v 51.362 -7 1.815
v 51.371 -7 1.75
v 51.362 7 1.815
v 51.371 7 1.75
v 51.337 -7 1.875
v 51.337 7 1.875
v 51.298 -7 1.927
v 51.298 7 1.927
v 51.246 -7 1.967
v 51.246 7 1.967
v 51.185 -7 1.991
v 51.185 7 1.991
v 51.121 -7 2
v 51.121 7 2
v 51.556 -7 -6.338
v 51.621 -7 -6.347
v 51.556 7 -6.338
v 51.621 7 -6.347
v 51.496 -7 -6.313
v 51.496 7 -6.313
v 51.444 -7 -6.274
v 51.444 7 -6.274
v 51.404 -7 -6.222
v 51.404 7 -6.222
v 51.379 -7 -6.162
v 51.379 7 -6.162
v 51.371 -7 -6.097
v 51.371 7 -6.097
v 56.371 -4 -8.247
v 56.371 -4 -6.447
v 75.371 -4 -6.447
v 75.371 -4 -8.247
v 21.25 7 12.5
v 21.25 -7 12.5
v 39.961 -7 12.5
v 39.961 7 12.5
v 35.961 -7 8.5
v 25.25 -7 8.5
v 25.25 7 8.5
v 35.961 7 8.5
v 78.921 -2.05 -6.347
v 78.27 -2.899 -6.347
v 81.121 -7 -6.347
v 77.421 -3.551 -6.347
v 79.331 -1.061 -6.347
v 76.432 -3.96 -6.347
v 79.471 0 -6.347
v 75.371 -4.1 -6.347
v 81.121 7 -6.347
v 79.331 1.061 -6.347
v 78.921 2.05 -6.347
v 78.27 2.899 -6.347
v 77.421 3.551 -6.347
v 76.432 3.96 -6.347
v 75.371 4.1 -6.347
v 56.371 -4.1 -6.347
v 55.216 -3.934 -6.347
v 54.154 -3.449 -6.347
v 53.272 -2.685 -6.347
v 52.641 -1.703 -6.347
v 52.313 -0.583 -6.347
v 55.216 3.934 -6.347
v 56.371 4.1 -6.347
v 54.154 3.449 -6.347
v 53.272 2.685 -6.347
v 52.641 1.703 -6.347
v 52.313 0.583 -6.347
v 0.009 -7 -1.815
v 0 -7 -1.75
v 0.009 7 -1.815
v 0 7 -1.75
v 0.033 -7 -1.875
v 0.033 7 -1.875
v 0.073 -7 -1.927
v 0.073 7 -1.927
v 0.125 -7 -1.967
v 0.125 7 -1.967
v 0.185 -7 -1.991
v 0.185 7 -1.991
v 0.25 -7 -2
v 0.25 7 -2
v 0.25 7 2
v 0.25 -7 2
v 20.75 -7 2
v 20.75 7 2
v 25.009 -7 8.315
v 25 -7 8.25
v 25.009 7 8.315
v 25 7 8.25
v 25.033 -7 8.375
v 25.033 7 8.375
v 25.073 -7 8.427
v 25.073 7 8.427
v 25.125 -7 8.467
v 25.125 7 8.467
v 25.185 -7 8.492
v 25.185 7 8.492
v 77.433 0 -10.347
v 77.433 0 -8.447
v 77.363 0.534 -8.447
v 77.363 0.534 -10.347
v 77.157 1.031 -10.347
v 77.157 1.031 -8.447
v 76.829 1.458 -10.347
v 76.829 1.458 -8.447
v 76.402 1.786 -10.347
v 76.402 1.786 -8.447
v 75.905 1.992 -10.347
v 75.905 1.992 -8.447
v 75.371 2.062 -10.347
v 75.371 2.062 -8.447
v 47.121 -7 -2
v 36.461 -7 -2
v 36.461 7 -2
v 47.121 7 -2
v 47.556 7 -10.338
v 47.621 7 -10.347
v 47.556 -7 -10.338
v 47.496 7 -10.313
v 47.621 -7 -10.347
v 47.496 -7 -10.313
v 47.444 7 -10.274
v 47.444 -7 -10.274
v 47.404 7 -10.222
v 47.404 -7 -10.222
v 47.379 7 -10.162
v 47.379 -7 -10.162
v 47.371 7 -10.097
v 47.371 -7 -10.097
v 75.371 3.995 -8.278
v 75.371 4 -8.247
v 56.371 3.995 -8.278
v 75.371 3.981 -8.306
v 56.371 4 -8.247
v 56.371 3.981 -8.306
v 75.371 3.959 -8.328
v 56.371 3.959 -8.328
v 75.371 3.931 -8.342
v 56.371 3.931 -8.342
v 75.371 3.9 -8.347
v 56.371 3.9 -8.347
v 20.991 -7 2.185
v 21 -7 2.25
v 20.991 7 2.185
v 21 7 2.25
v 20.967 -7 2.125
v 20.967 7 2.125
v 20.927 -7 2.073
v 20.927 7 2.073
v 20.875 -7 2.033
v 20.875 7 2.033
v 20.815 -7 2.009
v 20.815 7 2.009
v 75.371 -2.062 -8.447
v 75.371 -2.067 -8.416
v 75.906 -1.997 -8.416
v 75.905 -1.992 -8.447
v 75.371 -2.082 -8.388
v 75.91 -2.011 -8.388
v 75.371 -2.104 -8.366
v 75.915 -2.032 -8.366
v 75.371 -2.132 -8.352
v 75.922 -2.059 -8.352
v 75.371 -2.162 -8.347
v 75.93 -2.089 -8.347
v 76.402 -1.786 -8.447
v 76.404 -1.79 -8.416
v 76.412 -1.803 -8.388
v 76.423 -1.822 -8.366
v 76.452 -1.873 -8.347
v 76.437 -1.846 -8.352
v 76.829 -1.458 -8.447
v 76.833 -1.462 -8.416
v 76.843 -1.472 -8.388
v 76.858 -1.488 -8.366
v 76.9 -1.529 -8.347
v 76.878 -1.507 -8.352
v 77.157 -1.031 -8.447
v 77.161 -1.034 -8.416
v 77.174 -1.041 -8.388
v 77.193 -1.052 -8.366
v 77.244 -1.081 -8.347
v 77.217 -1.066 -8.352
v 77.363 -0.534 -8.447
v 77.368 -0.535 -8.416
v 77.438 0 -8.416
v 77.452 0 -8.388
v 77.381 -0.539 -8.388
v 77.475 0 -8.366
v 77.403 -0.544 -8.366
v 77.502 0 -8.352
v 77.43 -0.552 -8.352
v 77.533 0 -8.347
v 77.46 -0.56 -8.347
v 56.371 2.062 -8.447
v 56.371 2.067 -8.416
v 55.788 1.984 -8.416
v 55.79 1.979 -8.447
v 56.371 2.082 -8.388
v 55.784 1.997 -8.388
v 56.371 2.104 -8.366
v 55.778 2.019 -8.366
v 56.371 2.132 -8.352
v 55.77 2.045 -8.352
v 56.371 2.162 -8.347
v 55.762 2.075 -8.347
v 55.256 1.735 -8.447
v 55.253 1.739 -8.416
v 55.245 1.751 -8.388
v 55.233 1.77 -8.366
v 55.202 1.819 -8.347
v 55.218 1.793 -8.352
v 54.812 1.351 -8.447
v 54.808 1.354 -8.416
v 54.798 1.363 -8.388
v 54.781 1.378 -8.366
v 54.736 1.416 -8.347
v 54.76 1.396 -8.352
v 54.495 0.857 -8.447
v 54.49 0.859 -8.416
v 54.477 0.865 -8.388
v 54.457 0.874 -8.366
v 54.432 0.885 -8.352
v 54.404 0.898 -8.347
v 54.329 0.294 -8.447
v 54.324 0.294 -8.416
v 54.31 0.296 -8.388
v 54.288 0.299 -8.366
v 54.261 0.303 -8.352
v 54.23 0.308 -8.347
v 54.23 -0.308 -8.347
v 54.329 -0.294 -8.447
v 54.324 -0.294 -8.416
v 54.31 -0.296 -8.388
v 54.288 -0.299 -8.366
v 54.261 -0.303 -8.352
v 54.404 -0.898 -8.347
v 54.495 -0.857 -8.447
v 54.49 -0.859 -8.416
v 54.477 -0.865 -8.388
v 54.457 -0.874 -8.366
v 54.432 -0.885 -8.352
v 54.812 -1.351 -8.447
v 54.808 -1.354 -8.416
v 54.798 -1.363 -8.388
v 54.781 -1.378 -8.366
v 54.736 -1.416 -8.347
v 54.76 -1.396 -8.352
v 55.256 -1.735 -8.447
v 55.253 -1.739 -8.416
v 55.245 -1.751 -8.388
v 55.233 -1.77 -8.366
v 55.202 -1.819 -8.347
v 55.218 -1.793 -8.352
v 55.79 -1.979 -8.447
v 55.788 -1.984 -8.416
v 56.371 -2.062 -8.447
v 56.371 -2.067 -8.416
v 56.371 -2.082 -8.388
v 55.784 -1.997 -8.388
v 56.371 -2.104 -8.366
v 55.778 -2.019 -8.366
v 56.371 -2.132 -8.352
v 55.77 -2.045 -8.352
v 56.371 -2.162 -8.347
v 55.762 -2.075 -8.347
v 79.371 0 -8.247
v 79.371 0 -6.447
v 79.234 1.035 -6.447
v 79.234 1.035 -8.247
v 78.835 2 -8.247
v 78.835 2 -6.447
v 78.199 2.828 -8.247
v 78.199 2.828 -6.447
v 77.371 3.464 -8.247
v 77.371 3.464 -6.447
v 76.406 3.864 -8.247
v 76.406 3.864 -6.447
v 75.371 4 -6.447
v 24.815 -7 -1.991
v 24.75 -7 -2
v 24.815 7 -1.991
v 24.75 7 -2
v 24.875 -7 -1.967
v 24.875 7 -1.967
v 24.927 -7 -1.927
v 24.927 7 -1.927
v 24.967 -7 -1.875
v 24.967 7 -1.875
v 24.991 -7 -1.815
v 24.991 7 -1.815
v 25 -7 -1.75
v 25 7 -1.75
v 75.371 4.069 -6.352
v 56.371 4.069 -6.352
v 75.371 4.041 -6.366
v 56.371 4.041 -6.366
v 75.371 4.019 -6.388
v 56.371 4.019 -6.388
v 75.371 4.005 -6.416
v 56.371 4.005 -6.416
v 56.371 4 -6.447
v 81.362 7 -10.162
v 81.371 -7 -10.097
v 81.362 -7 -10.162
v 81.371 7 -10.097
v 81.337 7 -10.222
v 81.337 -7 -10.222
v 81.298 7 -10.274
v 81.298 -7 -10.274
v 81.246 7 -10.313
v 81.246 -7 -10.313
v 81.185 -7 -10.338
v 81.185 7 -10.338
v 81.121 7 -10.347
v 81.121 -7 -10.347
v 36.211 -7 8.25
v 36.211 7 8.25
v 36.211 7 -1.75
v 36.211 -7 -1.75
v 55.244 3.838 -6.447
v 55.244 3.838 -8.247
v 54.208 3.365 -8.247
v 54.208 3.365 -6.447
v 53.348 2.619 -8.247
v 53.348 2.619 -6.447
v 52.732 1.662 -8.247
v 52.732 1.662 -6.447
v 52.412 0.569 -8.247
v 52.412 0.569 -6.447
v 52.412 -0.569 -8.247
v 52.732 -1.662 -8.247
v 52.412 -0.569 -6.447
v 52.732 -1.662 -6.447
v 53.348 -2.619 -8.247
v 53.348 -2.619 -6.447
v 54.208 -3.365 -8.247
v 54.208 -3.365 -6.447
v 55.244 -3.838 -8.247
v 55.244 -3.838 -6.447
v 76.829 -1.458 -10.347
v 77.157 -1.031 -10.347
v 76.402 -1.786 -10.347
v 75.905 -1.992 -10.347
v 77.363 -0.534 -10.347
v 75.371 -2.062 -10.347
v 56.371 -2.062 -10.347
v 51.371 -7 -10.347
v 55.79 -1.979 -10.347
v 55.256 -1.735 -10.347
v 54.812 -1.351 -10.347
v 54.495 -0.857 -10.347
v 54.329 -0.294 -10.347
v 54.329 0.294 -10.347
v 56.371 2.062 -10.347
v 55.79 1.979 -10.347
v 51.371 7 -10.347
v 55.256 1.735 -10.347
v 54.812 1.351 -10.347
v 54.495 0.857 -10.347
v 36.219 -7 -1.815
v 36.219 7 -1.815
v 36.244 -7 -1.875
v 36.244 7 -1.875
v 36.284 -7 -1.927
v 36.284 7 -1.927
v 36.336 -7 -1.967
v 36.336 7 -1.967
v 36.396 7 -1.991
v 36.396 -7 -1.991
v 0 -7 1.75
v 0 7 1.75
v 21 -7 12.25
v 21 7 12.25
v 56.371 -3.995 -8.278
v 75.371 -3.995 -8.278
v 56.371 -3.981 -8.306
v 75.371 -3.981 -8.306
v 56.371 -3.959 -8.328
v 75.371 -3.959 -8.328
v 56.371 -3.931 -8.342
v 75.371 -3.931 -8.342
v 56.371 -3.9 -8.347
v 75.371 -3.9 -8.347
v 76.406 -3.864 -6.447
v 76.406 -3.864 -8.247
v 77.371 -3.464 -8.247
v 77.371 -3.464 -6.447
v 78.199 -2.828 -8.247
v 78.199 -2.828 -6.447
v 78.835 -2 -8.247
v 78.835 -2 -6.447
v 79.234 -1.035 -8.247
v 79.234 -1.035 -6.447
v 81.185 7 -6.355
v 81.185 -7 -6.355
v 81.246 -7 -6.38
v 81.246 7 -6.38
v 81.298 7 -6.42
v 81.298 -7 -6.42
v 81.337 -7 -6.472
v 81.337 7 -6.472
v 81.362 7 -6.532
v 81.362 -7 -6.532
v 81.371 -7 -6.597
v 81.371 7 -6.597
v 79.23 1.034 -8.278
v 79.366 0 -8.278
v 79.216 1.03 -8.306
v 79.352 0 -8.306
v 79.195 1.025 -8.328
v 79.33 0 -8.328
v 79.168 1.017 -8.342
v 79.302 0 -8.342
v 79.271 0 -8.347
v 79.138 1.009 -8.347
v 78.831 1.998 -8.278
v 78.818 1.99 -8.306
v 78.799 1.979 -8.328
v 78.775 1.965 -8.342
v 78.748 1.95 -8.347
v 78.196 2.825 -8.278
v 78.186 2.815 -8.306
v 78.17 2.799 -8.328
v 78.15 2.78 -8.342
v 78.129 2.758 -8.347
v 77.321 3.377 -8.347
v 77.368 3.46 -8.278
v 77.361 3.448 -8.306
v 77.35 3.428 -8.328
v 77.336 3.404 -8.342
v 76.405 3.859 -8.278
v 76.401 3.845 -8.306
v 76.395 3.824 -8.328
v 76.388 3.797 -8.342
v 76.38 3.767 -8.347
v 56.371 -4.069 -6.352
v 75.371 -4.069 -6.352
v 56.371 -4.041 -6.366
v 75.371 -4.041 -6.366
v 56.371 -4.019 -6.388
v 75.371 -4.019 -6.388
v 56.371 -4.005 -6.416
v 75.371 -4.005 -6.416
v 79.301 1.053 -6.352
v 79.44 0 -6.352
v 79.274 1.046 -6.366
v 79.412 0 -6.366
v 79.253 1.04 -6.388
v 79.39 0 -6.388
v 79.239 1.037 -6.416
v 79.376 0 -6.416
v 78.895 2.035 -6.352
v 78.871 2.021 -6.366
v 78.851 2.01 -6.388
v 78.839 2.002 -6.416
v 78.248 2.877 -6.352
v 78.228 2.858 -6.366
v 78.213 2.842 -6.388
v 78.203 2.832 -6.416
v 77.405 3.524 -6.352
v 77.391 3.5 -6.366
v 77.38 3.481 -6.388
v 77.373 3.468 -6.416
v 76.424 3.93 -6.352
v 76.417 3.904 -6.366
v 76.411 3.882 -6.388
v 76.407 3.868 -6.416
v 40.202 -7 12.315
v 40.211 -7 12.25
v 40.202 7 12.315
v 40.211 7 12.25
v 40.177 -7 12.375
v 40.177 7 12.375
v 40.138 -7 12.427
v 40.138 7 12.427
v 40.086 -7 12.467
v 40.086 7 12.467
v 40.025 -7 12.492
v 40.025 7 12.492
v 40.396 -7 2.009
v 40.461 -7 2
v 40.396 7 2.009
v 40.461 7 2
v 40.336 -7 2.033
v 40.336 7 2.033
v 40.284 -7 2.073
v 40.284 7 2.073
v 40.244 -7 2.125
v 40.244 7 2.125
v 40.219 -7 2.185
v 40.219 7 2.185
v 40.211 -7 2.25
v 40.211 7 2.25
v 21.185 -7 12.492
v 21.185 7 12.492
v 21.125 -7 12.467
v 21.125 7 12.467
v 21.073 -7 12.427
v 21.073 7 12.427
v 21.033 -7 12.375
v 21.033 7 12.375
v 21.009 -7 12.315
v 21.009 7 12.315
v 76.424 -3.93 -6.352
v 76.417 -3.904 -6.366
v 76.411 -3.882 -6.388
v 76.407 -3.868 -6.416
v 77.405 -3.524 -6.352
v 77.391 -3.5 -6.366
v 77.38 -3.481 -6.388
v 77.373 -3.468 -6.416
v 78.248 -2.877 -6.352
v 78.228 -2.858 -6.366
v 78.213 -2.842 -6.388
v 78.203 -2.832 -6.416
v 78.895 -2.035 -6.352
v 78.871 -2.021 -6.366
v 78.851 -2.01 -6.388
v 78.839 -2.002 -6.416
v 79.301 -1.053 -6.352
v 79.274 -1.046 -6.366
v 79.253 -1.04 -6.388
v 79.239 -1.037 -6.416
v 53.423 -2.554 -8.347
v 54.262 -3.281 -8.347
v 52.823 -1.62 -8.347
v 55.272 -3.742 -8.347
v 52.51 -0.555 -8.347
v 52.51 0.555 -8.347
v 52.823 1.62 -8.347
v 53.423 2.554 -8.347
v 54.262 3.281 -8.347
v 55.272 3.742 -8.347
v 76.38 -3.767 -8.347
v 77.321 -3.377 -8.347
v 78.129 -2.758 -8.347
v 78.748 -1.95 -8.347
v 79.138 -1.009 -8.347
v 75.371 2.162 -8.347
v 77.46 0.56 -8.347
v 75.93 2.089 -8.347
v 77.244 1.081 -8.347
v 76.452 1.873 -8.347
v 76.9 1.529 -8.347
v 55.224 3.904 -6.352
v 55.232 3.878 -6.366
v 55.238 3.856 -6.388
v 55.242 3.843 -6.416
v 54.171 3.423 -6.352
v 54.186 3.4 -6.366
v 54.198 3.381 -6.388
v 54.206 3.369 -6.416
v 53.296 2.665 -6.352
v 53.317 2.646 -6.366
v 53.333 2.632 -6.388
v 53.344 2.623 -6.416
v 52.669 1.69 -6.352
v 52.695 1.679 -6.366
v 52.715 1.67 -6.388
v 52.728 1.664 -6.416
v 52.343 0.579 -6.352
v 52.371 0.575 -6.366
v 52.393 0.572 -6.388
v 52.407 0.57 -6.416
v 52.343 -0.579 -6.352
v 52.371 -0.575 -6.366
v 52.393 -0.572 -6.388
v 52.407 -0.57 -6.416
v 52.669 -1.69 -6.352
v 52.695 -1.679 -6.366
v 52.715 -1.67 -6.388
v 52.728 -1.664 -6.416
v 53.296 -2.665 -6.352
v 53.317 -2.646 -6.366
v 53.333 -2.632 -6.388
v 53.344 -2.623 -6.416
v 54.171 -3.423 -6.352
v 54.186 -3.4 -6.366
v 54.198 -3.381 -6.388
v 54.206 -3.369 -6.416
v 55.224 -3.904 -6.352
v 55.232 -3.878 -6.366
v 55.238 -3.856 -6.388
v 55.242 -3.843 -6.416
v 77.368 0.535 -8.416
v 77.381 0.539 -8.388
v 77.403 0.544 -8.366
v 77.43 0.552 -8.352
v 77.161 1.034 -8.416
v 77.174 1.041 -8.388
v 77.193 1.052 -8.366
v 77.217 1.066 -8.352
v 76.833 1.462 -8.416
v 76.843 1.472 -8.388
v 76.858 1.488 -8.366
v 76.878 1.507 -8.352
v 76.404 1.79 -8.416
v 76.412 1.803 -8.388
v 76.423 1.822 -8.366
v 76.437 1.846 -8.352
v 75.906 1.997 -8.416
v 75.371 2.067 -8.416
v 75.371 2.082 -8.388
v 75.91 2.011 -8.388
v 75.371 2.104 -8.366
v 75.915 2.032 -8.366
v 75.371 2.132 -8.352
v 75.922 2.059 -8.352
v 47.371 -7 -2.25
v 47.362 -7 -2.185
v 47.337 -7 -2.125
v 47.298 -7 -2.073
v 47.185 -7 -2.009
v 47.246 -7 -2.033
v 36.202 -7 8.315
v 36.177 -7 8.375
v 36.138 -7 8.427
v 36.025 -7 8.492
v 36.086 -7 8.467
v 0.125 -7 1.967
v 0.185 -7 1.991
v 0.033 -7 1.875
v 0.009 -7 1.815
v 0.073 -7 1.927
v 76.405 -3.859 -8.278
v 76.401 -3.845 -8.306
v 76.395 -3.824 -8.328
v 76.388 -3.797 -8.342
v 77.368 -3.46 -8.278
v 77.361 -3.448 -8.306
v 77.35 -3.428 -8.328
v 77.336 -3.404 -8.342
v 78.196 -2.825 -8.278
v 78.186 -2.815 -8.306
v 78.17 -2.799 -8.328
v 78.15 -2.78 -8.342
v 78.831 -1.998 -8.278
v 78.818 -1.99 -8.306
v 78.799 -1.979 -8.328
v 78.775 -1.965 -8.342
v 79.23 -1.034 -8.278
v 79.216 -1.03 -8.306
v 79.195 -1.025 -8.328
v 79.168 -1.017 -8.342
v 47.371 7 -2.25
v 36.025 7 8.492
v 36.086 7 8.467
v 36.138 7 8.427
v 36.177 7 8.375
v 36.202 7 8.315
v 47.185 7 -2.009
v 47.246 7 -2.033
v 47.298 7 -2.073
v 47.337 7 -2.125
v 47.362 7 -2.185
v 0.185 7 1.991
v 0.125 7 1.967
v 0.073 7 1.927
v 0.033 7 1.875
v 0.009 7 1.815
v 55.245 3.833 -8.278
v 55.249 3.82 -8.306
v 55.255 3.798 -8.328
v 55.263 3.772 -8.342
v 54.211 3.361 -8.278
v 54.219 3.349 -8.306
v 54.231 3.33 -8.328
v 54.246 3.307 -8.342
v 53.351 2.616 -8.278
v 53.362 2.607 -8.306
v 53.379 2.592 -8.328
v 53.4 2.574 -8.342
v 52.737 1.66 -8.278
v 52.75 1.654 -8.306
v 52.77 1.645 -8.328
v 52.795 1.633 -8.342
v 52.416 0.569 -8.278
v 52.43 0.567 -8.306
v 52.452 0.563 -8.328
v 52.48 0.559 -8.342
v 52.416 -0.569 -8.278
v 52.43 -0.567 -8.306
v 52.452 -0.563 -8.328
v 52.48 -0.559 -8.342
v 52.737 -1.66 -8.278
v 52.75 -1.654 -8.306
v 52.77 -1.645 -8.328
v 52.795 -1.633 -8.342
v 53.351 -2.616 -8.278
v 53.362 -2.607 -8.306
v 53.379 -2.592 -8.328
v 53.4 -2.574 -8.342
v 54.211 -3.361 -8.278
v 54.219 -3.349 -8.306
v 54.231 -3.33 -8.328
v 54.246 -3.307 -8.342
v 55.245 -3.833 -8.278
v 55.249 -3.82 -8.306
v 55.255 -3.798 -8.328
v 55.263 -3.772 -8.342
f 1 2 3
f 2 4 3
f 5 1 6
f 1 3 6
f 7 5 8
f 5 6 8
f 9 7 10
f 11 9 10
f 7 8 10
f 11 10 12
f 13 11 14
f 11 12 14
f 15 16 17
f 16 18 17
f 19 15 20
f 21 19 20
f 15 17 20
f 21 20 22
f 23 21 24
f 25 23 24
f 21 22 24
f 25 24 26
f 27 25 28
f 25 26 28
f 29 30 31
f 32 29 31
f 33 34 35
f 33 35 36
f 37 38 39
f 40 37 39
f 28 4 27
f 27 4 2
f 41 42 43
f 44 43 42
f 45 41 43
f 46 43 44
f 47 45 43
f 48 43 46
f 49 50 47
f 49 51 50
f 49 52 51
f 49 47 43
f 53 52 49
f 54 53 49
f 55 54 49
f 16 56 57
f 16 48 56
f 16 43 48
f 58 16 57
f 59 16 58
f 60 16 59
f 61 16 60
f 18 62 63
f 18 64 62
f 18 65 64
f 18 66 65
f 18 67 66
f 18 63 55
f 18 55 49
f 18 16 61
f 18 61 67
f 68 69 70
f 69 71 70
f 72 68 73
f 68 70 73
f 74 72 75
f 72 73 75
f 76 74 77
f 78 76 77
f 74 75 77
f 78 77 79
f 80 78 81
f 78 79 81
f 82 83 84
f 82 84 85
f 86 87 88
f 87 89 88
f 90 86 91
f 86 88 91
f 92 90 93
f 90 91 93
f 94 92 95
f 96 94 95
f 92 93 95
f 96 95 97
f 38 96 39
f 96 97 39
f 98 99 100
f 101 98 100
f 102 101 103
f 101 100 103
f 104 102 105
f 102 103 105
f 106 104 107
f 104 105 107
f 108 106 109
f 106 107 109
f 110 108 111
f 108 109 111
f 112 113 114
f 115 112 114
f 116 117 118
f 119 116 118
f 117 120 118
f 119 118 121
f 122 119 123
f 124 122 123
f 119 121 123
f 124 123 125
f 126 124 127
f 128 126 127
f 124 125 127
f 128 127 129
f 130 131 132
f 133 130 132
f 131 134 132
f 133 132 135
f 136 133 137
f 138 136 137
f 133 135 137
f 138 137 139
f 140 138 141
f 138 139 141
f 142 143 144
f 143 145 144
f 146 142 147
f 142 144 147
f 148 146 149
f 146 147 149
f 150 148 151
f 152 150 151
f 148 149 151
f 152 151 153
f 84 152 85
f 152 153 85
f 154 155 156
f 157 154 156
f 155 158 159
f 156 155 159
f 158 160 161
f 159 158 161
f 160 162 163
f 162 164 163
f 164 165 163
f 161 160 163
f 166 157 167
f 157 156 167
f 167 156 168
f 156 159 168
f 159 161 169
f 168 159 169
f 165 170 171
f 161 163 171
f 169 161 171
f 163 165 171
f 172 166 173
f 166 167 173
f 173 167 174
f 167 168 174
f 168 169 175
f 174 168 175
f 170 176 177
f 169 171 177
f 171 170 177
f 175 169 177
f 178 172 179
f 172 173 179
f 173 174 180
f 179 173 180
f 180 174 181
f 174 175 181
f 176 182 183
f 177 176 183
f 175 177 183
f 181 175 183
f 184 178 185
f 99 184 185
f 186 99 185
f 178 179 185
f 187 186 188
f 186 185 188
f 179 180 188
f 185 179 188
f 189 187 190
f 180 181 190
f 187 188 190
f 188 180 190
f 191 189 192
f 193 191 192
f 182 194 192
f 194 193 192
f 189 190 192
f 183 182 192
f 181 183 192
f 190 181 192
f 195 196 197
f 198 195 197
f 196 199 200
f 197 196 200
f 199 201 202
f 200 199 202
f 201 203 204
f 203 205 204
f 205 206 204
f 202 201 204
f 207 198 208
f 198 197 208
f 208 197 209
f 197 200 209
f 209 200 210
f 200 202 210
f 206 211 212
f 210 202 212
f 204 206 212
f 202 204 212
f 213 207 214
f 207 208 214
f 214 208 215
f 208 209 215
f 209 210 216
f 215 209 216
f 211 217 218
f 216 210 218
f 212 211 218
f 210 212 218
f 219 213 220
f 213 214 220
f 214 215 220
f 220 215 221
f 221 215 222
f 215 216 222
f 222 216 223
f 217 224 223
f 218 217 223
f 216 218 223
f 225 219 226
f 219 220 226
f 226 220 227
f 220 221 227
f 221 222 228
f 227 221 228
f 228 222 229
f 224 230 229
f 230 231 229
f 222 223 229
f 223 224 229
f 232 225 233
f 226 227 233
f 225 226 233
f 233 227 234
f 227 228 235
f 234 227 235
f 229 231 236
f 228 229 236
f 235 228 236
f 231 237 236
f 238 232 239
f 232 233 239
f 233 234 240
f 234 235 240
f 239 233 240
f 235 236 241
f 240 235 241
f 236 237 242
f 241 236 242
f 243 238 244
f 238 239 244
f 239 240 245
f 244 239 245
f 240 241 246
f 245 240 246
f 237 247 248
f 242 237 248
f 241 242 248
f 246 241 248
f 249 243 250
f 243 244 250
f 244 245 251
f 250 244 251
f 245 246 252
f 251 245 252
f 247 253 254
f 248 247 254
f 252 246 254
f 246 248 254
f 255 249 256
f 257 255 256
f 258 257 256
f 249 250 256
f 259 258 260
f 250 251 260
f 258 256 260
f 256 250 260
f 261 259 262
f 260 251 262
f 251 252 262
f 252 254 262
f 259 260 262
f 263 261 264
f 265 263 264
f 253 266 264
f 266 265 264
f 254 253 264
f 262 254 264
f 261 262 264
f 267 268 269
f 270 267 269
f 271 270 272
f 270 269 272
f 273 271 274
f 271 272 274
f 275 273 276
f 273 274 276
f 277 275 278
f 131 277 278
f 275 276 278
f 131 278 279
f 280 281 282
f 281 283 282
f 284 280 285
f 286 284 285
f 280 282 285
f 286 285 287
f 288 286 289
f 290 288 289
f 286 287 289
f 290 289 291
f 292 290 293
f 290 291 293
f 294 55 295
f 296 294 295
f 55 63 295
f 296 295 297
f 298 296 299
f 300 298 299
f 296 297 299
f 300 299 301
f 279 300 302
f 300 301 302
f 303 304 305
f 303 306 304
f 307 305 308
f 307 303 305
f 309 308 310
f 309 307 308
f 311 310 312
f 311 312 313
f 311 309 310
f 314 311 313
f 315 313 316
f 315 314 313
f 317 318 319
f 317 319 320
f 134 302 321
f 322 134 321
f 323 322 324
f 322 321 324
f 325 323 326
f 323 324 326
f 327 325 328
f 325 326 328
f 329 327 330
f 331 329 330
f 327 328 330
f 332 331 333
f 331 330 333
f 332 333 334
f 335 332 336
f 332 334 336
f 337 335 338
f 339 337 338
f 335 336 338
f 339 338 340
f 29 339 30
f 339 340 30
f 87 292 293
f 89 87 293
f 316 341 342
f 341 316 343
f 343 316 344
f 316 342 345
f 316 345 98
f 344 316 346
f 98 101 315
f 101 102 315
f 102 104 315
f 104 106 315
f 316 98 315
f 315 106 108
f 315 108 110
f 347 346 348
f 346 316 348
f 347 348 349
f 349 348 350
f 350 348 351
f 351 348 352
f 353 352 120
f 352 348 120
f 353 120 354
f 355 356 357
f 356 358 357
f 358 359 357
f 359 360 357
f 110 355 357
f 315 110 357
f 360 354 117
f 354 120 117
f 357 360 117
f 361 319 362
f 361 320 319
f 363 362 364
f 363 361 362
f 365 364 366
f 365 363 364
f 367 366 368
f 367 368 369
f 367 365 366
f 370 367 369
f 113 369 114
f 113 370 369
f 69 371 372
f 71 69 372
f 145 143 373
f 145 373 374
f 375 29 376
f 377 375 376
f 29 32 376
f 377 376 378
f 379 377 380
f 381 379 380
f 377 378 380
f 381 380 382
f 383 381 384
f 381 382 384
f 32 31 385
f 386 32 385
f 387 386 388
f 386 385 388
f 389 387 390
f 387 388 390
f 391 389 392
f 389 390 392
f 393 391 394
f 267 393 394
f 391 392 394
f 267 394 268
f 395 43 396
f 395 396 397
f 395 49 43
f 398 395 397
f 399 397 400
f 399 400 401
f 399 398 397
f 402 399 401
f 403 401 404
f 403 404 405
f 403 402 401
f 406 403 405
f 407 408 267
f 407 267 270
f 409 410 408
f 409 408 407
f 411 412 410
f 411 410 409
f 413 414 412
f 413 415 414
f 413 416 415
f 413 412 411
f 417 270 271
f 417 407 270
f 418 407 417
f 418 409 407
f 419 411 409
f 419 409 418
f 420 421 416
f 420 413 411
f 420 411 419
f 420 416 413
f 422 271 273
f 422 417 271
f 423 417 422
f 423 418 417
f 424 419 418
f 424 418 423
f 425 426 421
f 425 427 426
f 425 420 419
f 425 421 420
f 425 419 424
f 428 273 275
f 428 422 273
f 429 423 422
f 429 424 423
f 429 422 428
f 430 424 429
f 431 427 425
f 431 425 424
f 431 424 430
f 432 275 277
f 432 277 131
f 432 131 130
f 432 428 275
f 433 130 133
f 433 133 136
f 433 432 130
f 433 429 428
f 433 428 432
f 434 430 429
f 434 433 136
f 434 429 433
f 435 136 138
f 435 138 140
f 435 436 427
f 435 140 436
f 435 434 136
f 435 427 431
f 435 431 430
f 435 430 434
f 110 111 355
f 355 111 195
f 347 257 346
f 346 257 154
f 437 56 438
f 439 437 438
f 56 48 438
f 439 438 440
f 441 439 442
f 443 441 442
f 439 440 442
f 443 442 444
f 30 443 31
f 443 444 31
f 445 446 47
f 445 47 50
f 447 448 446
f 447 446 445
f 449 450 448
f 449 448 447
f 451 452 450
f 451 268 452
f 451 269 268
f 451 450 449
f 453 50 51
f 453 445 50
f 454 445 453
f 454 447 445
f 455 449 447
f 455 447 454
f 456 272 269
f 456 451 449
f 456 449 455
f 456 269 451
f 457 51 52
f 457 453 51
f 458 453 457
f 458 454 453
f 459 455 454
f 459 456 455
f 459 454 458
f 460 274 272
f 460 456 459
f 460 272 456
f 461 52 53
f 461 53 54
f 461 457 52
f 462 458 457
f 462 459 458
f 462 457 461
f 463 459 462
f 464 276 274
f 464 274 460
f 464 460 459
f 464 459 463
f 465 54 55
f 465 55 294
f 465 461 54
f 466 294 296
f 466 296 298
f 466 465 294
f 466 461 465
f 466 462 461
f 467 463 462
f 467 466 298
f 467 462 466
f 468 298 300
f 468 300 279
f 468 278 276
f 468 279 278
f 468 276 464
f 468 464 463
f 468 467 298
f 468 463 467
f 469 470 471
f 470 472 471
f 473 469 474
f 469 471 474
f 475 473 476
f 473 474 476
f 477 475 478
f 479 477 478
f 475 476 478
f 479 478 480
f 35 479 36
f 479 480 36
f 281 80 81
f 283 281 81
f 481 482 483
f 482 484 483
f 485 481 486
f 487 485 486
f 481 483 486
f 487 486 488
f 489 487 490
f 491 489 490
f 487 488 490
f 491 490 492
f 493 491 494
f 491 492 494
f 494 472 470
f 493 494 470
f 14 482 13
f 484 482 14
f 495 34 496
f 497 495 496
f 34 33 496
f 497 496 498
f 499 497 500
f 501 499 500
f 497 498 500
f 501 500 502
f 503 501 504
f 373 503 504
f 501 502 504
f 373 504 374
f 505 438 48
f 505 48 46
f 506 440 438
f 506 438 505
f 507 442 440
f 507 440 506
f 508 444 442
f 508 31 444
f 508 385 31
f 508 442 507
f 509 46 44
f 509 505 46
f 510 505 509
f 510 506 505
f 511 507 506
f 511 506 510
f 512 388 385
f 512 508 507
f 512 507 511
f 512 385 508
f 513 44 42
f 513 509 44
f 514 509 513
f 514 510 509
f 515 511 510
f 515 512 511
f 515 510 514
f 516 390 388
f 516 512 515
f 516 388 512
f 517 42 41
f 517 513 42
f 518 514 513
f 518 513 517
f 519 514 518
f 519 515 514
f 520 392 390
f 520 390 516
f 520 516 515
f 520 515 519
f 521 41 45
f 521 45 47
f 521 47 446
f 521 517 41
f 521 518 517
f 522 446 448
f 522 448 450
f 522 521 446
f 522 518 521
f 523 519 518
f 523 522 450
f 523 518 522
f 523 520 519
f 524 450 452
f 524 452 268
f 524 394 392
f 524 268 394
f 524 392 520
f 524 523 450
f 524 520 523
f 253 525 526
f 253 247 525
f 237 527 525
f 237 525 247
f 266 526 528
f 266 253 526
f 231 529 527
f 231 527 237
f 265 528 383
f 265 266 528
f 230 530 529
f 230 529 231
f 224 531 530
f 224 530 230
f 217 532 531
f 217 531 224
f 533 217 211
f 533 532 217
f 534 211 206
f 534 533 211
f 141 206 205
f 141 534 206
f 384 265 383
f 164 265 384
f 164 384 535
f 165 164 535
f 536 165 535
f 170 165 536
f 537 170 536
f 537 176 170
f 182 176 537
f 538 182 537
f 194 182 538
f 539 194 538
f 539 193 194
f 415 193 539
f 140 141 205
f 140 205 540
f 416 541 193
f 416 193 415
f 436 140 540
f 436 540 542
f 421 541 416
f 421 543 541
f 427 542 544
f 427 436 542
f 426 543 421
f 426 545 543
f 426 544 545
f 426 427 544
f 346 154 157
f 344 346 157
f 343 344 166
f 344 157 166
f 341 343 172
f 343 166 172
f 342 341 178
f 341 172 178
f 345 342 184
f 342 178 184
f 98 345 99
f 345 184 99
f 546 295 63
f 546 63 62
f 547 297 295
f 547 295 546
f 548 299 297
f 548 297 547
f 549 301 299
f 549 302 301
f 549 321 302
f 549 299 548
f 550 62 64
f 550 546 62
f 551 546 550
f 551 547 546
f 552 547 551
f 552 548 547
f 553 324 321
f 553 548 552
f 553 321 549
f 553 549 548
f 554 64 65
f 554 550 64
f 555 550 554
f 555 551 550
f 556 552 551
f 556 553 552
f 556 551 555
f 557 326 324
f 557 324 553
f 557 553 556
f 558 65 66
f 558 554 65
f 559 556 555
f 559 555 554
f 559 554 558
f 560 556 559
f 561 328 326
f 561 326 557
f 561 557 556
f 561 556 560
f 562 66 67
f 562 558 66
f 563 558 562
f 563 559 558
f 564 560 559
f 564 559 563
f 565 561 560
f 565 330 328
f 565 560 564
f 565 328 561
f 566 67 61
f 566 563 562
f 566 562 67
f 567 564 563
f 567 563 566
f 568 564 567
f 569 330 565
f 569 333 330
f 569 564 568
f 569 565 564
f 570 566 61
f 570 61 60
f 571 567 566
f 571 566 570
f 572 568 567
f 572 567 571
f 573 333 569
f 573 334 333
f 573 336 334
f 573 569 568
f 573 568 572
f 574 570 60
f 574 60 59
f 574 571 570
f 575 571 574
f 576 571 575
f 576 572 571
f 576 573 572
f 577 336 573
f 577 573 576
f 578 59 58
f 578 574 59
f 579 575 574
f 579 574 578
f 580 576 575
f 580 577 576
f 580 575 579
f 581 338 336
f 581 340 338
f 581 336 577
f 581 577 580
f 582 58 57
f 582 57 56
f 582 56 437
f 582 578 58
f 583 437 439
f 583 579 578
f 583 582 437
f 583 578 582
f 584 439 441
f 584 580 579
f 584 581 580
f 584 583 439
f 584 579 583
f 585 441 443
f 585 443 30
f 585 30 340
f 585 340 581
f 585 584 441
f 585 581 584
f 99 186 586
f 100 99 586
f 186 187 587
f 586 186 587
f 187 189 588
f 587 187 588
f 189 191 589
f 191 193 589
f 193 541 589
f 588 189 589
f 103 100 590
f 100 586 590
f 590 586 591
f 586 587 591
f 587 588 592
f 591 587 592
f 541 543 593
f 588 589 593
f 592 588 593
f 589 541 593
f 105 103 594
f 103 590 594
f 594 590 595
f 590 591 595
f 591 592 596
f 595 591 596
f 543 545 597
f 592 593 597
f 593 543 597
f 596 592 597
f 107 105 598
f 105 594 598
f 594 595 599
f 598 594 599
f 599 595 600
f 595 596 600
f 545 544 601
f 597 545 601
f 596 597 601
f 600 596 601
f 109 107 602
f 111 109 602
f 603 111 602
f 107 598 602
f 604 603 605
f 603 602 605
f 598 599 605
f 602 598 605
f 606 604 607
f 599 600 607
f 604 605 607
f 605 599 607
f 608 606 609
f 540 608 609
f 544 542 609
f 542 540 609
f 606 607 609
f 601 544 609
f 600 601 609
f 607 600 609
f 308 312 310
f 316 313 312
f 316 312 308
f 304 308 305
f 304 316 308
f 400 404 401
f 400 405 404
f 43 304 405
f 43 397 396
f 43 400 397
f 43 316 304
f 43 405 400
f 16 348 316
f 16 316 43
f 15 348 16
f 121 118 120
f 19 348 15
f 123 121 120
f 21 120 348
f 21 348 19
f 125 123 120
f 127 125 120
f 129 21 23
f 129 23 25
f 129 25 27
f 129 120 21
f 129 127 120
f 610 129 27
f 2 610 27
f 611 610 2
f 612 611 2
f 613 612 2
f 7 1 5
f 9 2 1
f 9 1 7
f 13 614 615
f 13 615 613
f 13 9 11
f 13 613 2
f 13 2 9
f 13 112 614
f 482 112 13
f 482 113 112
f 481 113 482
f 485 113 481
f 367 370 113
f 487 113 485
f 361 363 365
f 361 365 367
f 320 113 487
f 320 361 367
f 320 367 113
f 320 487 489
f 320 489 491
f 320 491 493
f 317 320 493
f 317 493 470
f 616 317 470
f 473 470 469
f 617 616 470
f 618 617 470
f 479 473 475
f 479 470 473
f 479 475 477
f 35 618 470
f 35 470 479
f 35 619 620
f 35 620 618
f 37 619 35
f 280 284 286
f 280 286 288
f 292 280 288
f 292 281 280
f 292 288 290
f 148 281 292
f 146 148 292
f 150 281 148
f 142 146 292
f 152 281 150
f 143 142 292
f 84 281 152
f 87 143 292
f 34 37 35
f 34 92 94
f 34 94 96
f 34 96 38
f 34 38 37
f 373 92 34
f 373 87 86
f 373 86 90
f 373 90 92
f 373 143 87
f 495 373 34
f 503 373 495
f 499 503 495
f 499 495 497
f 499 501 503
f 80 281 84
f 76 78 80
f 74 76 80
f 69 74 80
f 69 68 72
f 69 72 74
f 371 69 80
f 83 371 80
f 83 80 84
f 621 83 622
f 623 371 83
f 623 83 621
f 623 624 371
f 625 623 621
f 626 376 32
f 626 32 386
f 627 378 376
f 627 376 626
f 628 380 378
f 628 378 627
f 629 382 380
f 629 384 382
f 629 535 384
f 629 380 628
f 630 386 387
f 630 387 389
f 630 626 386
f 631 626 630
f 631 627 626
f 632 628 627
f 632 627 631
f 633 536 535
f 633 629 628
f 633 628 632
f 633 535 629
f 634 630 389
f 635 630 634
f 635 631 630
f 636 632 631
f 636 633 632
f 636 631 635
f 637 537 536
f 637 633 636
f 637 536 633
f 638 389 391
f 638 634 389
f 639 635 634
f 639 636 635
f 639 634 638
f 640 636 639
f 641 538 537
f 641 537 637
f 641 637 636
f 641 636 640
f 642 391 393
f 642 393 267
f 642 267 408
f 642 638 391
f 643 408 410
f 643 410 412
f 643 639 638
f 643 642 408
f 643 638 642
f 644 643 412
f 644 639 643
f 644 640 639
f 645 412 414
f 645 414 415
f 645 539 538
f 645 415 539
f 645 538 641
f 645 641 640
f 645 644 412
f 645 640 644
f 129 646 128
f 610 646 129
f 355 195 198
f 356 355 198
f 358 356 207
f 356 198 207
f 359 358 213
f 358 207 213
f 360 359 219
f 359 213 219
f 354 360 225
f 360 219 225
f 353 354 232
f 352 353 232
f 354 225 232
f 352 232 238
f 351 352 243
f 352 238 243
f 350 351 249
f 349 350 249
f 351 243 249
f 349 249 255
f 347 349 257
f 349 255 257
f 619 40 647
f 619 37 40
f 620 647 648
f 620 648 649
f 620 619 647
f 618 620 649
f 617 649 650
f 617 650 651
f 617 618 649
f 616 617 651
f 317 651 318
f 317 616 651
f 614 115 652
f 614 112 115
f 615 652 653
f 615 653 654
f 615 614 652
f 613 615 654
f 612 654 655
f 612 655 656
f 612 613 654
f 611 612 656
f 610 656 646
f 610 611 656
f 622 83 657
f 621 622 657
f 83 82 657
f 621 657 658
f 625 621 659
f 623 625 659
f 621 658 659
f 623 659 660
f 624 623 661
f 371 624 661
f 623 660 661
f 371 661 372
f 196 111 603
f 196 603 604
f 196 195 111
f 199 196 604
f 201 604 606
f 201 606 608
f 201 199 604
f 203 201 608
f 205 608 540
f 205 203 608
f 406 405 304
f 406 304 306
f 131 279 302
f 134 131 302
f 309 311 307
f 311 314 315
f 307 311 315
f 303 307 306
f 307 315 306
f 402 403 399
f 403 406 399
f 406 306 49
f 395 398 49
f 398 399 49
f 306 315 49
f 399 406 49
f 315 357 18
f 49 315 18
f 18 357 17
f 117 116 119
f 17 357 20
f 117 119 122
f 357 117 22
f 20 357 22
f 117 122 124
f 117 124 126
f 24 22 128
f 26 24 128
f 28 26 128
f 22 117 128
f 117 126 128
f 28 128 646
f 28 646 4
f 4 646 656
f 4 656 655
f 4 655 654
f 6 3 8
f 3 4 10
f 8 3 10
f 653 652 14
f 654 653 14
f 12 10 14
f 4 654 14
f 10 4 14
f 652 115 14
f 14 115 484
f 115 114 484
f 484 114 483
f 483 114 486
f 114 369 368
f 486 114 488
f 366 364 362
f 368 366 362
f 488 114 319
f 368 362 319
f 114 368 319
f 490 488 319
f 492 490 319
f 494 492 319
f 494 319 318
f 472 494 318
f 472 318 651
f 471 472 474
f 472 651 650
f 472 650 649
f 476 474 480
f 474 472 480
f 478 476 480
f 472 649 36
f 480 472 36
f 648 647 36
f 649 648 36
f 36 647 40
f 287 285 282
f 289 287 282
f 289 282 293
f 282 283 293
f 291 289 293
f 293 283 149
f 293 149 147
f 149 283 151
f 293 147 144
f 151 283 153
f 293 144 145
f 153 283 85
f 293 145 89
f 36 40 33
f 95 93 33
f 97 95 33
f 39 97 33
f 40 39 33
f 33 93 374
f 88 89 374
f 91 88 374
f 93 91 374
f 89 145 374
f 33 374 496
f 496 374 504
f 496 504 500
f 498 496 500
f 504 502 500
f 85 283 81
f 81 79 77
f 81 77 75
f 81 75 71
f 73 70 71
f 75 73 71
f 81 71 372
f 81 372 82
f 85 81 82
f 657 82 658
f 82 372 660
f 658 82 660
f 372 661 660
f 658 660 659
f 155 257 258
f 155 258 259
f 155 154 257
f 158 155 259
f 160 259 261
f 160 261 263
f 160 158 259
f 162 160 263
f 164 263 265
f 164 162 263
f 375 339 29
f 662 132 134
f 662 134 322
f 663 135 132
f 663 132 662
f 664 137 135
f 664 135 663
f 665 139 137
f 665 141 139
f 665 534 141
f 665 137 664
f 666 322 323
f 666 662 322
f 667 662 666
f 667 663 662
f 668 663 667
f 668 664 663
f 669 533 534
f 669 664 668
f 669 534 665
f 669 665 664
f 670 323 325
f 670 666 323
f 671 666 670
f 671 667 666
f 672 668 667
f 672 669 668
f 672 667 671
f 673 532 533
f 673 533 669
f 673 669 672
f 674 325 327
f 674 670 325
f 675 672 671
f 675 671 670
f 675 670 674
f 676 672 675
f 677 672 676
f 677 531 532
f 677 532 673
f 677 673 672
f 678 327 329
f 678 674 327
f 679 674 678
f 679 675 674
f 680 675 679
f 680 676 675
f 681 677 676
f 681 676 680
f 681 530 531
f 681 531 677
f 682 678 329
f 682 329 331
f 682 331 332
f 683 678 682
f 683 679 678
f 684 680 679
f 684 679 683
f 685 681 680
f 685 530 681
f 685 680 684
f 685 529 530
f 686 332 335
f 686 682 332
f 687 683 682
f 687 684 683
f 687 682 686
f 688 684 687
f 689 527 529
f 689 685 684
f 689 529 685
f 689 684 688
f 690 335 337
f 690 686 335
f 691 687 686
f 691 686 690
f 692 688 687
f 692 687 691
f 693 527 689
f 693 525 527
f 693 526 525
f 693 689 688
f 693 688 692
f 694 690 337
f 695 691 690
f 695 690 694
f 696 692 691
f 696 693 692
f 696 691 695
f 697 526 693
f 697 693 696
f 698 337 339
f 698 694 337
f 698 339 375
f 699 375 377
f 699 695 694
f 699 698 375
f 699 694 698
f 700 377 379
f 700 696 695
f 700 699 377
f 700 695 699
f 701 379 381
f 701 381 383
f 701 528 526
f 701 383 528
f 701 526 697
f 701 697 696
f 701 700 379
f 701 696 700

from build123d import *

# Parameters (mm, degrees)
F0_W      = 14
F0_H      = 4
F1_DEPTH  = 25
F2_W      = 4
F2_H      = 14
F3_DEPTH  = 10.50036
F4_W      = 14
F4_H      = 4
F5_DEPTH  = 15.21079
F6_W      = 4
F6_H      = 14
F7_DEPTH  = 10.50036
F8_W      = 14
F8_H      = 4
F9_DEPTH  = 11.159998
F10_W     = 4
F10_H     = 14
F11_DEPTH = 8.346948
F12_W     = 14
F12_H     = 4
F13_DEPTH = 30
F15_DEPTH = 3.9999999999
F17_DEPTH = 2
F18_R     = 0.1
F19_R     = 0.25


with BuildPart() as f1:
    # F0 (on Right) → F1 (new body)
    with BuildSketch(Plane.YZ):
        Rectangle(F0_W, F0_H)
    extrude(amount=F1_DEPTH)

    # F2 (on face) → F3 (join)
    with BuildSketch(Plane.XY.offset(2)):
        with Locations((23, 0)):
            Rectangle(F2_W, F2_H)
    extrude(amount=F3_DEPTH)

    # F4 (on face) → F5 (join)
    with BuildSketch(Plane.YZ.offset(25)):
        with Locations((0, 10.50036)):
            Rectangle(F4_W, F4_H)
    extrude(amount=F5_DEPTH)

    # F6 (on face) → F7 (join, through all)
    with BuildSketch(Plane(origin=(0, 0, 8.50036), x_dir=(1, 0, 0), z_dir=(0, 0, -1))):
        with Locations((38.21079, 0)):
            Rectangle(F6_W, F6_H)
    extrude(amount=F7_DEPTH)

    # F8 (on face) → F9 (join)
    with BuildSketch(Plane.YZ.offset(40.21079)):
        Rectangle(F8_W, F8_H)
    extrude(amount=F9_DEPTH)

    # F10 (on face) → F11 (join)
    with BuildSketch(Plane(origin=(0, 0, -2), x_dir=(1, 0, 0), z_dir=(0, 0, -1))):
        with Locations((49.370788, 0)):
            Rectangle(F10_W, F10_H)
    extrude(amount=F11_DEPTH)

    # F12 (on face) → F13 (join)
    with BuildSketch(Plane.YZ.offset(51.370788)):
        with Locations((0, -8.3469480001)):
            Rectangle(F12_W, F12_H)
    extrude(amount=F13_DEPTH)

    # F14 (on face) → F15 (cut, through all)
    with BuildSketch(Plane.XY.offset(-6.3469480001)):
        with BuildLine():
            ThreePointArc((56.370788, -2.0625), (57.8291957362, -1.4584077362), (58.433288, 0))
            ThreePointArc((58.433288, 0), (57.8291957362, 1.4584077362), (56.370788, 2.0625))
            ThreePointArc((56.370788, 2.0625), (54.308288, 0), (56.370788, -2.0625))
        make_face()
        with BuildLine():
            ThreePointArc((56.370788, 2.0625), (57.8291957362, 1.4584077362), (58.433288, 0))
            ThreePointArc((58.433288, 0), (57.8291957362, -1.4584077362), (56.370788, -2.0625))
            Line((56.370788, -2.0625), (75.370788, -2.0625))
            ThreePointArc((75.370788, -2.0625), (73.308288, 0), (75.370788, 2.0625))
            Line((75.370788, 2.0625), (56.370788, 2.0625))
        make_face()
        with BuildLine():
            ThreePointArc((77.433288, 0), (76.8291957362, 1.4584077362), (75.370788, 2.0625))
            ThreePointArc((75.370788, 2.0625), (73.308288, 0), (75.370788, -2.0625))
            ThreePointArc((75.370788, -2.0625), (76.8291957362, -1.4584077362), (77.433288, 0))
        make_face()
    extrude(amount=-F15_DEPTH, mode=Mode.SUBTRACT)

    # F16 (on face) → F17 (cut)
    with BuildSketch(Plane.XY.offset(-6.3469480001)):
        with BuildLine():
            ThreePointArc((56.370788, -4), (59.1992151247, -2.8284271247), (60.370788, 0))
            ThreePointArc((60.370788, 0), (59.1992151247, 2.8284271247), (56.370788, 4))
            ThreePointArc((56.370788, 4), (52.370788, 0), (56.370788, -4))
        make_face()
        with BuildLine():
            ThreePointArc((56.370788, 4), (59.1992151247, 2.8284271247), (60.370788, 0))
            ThreePointArc((60.370788, 0), (59.1992151247, -2.8284271247), (56.370788, -4))
            Line((56.370788, -4), (75.370788, -4))
            ThreePointArc((75.370788, -4), (71.370788, 0), (75.370788, 4))
            Line((75.370788, 4), (56.370788, 4))
        make_face()
        with BuildLine():
            ThreePointArc((79.370788, 0), (78.1992151247, 2.8284271247), (75.370788, 4))
            ThreePointArc((75.370788, 4), (71.370788, 0), (75.370788, -4))
            ThreePointArc((75.370788, -4), (78.1992151247, -2.8284271247), (79.370788, 0))
        make_face()
    extrude(amount=-F17_DEPTH, mode=Mode.SUBTRACT)

    # F18
    f18_edges = [f1.edges().sort_by_distance(p)[0] for p in [
        (52.370788, 0, -6.346948),
        (65.870788, 4, -6.346948),
        (79.370788, 0, -6.346948),
        (65.870788, -4, -6.346948),
        (65.870788, 4, -8.346948),
        (52.370788, 0, -8.346948),
        (54.308288, 0, -8.346948),
        (65.870788, 2.0625, -8.346948),
        (77.433288, 0, -8.346948),
        (79.370788, 0, -8.346948),
        (65.870788, -4, -8.346948),
        (65.870788, -2.0625, -8.346948),
    ]]
    fillet(f18_edges, radius=F18_R)

    # F19
    f19_edges = [f1.edges().sort_by_distance(p)[0] for p in [
        (51.370788, 0, -6.346948),
        (51.370788, 0, 2),
        (40.21079, 0, 2),
        (40.21079, 0, 12.50036),
        (21, 0, 2),
        (21, 0, 12.50036),
        (0, 0, 2),
        (0, 0, -2),
        (25, 0, -2),
        (25, 0, 8.50036),
        (36.21079, 0, 8.50036),
        (47.370788, 0, -2),
        (47.370788, 0, -10.346948),
        (81.370788, 0, -10.346948),
        (81.370788, 0, -6.346948),
        (36.21079, 0, -2),
    ]]
    fillet(f19_edges, radius=F19_R)


solid = f1.part
